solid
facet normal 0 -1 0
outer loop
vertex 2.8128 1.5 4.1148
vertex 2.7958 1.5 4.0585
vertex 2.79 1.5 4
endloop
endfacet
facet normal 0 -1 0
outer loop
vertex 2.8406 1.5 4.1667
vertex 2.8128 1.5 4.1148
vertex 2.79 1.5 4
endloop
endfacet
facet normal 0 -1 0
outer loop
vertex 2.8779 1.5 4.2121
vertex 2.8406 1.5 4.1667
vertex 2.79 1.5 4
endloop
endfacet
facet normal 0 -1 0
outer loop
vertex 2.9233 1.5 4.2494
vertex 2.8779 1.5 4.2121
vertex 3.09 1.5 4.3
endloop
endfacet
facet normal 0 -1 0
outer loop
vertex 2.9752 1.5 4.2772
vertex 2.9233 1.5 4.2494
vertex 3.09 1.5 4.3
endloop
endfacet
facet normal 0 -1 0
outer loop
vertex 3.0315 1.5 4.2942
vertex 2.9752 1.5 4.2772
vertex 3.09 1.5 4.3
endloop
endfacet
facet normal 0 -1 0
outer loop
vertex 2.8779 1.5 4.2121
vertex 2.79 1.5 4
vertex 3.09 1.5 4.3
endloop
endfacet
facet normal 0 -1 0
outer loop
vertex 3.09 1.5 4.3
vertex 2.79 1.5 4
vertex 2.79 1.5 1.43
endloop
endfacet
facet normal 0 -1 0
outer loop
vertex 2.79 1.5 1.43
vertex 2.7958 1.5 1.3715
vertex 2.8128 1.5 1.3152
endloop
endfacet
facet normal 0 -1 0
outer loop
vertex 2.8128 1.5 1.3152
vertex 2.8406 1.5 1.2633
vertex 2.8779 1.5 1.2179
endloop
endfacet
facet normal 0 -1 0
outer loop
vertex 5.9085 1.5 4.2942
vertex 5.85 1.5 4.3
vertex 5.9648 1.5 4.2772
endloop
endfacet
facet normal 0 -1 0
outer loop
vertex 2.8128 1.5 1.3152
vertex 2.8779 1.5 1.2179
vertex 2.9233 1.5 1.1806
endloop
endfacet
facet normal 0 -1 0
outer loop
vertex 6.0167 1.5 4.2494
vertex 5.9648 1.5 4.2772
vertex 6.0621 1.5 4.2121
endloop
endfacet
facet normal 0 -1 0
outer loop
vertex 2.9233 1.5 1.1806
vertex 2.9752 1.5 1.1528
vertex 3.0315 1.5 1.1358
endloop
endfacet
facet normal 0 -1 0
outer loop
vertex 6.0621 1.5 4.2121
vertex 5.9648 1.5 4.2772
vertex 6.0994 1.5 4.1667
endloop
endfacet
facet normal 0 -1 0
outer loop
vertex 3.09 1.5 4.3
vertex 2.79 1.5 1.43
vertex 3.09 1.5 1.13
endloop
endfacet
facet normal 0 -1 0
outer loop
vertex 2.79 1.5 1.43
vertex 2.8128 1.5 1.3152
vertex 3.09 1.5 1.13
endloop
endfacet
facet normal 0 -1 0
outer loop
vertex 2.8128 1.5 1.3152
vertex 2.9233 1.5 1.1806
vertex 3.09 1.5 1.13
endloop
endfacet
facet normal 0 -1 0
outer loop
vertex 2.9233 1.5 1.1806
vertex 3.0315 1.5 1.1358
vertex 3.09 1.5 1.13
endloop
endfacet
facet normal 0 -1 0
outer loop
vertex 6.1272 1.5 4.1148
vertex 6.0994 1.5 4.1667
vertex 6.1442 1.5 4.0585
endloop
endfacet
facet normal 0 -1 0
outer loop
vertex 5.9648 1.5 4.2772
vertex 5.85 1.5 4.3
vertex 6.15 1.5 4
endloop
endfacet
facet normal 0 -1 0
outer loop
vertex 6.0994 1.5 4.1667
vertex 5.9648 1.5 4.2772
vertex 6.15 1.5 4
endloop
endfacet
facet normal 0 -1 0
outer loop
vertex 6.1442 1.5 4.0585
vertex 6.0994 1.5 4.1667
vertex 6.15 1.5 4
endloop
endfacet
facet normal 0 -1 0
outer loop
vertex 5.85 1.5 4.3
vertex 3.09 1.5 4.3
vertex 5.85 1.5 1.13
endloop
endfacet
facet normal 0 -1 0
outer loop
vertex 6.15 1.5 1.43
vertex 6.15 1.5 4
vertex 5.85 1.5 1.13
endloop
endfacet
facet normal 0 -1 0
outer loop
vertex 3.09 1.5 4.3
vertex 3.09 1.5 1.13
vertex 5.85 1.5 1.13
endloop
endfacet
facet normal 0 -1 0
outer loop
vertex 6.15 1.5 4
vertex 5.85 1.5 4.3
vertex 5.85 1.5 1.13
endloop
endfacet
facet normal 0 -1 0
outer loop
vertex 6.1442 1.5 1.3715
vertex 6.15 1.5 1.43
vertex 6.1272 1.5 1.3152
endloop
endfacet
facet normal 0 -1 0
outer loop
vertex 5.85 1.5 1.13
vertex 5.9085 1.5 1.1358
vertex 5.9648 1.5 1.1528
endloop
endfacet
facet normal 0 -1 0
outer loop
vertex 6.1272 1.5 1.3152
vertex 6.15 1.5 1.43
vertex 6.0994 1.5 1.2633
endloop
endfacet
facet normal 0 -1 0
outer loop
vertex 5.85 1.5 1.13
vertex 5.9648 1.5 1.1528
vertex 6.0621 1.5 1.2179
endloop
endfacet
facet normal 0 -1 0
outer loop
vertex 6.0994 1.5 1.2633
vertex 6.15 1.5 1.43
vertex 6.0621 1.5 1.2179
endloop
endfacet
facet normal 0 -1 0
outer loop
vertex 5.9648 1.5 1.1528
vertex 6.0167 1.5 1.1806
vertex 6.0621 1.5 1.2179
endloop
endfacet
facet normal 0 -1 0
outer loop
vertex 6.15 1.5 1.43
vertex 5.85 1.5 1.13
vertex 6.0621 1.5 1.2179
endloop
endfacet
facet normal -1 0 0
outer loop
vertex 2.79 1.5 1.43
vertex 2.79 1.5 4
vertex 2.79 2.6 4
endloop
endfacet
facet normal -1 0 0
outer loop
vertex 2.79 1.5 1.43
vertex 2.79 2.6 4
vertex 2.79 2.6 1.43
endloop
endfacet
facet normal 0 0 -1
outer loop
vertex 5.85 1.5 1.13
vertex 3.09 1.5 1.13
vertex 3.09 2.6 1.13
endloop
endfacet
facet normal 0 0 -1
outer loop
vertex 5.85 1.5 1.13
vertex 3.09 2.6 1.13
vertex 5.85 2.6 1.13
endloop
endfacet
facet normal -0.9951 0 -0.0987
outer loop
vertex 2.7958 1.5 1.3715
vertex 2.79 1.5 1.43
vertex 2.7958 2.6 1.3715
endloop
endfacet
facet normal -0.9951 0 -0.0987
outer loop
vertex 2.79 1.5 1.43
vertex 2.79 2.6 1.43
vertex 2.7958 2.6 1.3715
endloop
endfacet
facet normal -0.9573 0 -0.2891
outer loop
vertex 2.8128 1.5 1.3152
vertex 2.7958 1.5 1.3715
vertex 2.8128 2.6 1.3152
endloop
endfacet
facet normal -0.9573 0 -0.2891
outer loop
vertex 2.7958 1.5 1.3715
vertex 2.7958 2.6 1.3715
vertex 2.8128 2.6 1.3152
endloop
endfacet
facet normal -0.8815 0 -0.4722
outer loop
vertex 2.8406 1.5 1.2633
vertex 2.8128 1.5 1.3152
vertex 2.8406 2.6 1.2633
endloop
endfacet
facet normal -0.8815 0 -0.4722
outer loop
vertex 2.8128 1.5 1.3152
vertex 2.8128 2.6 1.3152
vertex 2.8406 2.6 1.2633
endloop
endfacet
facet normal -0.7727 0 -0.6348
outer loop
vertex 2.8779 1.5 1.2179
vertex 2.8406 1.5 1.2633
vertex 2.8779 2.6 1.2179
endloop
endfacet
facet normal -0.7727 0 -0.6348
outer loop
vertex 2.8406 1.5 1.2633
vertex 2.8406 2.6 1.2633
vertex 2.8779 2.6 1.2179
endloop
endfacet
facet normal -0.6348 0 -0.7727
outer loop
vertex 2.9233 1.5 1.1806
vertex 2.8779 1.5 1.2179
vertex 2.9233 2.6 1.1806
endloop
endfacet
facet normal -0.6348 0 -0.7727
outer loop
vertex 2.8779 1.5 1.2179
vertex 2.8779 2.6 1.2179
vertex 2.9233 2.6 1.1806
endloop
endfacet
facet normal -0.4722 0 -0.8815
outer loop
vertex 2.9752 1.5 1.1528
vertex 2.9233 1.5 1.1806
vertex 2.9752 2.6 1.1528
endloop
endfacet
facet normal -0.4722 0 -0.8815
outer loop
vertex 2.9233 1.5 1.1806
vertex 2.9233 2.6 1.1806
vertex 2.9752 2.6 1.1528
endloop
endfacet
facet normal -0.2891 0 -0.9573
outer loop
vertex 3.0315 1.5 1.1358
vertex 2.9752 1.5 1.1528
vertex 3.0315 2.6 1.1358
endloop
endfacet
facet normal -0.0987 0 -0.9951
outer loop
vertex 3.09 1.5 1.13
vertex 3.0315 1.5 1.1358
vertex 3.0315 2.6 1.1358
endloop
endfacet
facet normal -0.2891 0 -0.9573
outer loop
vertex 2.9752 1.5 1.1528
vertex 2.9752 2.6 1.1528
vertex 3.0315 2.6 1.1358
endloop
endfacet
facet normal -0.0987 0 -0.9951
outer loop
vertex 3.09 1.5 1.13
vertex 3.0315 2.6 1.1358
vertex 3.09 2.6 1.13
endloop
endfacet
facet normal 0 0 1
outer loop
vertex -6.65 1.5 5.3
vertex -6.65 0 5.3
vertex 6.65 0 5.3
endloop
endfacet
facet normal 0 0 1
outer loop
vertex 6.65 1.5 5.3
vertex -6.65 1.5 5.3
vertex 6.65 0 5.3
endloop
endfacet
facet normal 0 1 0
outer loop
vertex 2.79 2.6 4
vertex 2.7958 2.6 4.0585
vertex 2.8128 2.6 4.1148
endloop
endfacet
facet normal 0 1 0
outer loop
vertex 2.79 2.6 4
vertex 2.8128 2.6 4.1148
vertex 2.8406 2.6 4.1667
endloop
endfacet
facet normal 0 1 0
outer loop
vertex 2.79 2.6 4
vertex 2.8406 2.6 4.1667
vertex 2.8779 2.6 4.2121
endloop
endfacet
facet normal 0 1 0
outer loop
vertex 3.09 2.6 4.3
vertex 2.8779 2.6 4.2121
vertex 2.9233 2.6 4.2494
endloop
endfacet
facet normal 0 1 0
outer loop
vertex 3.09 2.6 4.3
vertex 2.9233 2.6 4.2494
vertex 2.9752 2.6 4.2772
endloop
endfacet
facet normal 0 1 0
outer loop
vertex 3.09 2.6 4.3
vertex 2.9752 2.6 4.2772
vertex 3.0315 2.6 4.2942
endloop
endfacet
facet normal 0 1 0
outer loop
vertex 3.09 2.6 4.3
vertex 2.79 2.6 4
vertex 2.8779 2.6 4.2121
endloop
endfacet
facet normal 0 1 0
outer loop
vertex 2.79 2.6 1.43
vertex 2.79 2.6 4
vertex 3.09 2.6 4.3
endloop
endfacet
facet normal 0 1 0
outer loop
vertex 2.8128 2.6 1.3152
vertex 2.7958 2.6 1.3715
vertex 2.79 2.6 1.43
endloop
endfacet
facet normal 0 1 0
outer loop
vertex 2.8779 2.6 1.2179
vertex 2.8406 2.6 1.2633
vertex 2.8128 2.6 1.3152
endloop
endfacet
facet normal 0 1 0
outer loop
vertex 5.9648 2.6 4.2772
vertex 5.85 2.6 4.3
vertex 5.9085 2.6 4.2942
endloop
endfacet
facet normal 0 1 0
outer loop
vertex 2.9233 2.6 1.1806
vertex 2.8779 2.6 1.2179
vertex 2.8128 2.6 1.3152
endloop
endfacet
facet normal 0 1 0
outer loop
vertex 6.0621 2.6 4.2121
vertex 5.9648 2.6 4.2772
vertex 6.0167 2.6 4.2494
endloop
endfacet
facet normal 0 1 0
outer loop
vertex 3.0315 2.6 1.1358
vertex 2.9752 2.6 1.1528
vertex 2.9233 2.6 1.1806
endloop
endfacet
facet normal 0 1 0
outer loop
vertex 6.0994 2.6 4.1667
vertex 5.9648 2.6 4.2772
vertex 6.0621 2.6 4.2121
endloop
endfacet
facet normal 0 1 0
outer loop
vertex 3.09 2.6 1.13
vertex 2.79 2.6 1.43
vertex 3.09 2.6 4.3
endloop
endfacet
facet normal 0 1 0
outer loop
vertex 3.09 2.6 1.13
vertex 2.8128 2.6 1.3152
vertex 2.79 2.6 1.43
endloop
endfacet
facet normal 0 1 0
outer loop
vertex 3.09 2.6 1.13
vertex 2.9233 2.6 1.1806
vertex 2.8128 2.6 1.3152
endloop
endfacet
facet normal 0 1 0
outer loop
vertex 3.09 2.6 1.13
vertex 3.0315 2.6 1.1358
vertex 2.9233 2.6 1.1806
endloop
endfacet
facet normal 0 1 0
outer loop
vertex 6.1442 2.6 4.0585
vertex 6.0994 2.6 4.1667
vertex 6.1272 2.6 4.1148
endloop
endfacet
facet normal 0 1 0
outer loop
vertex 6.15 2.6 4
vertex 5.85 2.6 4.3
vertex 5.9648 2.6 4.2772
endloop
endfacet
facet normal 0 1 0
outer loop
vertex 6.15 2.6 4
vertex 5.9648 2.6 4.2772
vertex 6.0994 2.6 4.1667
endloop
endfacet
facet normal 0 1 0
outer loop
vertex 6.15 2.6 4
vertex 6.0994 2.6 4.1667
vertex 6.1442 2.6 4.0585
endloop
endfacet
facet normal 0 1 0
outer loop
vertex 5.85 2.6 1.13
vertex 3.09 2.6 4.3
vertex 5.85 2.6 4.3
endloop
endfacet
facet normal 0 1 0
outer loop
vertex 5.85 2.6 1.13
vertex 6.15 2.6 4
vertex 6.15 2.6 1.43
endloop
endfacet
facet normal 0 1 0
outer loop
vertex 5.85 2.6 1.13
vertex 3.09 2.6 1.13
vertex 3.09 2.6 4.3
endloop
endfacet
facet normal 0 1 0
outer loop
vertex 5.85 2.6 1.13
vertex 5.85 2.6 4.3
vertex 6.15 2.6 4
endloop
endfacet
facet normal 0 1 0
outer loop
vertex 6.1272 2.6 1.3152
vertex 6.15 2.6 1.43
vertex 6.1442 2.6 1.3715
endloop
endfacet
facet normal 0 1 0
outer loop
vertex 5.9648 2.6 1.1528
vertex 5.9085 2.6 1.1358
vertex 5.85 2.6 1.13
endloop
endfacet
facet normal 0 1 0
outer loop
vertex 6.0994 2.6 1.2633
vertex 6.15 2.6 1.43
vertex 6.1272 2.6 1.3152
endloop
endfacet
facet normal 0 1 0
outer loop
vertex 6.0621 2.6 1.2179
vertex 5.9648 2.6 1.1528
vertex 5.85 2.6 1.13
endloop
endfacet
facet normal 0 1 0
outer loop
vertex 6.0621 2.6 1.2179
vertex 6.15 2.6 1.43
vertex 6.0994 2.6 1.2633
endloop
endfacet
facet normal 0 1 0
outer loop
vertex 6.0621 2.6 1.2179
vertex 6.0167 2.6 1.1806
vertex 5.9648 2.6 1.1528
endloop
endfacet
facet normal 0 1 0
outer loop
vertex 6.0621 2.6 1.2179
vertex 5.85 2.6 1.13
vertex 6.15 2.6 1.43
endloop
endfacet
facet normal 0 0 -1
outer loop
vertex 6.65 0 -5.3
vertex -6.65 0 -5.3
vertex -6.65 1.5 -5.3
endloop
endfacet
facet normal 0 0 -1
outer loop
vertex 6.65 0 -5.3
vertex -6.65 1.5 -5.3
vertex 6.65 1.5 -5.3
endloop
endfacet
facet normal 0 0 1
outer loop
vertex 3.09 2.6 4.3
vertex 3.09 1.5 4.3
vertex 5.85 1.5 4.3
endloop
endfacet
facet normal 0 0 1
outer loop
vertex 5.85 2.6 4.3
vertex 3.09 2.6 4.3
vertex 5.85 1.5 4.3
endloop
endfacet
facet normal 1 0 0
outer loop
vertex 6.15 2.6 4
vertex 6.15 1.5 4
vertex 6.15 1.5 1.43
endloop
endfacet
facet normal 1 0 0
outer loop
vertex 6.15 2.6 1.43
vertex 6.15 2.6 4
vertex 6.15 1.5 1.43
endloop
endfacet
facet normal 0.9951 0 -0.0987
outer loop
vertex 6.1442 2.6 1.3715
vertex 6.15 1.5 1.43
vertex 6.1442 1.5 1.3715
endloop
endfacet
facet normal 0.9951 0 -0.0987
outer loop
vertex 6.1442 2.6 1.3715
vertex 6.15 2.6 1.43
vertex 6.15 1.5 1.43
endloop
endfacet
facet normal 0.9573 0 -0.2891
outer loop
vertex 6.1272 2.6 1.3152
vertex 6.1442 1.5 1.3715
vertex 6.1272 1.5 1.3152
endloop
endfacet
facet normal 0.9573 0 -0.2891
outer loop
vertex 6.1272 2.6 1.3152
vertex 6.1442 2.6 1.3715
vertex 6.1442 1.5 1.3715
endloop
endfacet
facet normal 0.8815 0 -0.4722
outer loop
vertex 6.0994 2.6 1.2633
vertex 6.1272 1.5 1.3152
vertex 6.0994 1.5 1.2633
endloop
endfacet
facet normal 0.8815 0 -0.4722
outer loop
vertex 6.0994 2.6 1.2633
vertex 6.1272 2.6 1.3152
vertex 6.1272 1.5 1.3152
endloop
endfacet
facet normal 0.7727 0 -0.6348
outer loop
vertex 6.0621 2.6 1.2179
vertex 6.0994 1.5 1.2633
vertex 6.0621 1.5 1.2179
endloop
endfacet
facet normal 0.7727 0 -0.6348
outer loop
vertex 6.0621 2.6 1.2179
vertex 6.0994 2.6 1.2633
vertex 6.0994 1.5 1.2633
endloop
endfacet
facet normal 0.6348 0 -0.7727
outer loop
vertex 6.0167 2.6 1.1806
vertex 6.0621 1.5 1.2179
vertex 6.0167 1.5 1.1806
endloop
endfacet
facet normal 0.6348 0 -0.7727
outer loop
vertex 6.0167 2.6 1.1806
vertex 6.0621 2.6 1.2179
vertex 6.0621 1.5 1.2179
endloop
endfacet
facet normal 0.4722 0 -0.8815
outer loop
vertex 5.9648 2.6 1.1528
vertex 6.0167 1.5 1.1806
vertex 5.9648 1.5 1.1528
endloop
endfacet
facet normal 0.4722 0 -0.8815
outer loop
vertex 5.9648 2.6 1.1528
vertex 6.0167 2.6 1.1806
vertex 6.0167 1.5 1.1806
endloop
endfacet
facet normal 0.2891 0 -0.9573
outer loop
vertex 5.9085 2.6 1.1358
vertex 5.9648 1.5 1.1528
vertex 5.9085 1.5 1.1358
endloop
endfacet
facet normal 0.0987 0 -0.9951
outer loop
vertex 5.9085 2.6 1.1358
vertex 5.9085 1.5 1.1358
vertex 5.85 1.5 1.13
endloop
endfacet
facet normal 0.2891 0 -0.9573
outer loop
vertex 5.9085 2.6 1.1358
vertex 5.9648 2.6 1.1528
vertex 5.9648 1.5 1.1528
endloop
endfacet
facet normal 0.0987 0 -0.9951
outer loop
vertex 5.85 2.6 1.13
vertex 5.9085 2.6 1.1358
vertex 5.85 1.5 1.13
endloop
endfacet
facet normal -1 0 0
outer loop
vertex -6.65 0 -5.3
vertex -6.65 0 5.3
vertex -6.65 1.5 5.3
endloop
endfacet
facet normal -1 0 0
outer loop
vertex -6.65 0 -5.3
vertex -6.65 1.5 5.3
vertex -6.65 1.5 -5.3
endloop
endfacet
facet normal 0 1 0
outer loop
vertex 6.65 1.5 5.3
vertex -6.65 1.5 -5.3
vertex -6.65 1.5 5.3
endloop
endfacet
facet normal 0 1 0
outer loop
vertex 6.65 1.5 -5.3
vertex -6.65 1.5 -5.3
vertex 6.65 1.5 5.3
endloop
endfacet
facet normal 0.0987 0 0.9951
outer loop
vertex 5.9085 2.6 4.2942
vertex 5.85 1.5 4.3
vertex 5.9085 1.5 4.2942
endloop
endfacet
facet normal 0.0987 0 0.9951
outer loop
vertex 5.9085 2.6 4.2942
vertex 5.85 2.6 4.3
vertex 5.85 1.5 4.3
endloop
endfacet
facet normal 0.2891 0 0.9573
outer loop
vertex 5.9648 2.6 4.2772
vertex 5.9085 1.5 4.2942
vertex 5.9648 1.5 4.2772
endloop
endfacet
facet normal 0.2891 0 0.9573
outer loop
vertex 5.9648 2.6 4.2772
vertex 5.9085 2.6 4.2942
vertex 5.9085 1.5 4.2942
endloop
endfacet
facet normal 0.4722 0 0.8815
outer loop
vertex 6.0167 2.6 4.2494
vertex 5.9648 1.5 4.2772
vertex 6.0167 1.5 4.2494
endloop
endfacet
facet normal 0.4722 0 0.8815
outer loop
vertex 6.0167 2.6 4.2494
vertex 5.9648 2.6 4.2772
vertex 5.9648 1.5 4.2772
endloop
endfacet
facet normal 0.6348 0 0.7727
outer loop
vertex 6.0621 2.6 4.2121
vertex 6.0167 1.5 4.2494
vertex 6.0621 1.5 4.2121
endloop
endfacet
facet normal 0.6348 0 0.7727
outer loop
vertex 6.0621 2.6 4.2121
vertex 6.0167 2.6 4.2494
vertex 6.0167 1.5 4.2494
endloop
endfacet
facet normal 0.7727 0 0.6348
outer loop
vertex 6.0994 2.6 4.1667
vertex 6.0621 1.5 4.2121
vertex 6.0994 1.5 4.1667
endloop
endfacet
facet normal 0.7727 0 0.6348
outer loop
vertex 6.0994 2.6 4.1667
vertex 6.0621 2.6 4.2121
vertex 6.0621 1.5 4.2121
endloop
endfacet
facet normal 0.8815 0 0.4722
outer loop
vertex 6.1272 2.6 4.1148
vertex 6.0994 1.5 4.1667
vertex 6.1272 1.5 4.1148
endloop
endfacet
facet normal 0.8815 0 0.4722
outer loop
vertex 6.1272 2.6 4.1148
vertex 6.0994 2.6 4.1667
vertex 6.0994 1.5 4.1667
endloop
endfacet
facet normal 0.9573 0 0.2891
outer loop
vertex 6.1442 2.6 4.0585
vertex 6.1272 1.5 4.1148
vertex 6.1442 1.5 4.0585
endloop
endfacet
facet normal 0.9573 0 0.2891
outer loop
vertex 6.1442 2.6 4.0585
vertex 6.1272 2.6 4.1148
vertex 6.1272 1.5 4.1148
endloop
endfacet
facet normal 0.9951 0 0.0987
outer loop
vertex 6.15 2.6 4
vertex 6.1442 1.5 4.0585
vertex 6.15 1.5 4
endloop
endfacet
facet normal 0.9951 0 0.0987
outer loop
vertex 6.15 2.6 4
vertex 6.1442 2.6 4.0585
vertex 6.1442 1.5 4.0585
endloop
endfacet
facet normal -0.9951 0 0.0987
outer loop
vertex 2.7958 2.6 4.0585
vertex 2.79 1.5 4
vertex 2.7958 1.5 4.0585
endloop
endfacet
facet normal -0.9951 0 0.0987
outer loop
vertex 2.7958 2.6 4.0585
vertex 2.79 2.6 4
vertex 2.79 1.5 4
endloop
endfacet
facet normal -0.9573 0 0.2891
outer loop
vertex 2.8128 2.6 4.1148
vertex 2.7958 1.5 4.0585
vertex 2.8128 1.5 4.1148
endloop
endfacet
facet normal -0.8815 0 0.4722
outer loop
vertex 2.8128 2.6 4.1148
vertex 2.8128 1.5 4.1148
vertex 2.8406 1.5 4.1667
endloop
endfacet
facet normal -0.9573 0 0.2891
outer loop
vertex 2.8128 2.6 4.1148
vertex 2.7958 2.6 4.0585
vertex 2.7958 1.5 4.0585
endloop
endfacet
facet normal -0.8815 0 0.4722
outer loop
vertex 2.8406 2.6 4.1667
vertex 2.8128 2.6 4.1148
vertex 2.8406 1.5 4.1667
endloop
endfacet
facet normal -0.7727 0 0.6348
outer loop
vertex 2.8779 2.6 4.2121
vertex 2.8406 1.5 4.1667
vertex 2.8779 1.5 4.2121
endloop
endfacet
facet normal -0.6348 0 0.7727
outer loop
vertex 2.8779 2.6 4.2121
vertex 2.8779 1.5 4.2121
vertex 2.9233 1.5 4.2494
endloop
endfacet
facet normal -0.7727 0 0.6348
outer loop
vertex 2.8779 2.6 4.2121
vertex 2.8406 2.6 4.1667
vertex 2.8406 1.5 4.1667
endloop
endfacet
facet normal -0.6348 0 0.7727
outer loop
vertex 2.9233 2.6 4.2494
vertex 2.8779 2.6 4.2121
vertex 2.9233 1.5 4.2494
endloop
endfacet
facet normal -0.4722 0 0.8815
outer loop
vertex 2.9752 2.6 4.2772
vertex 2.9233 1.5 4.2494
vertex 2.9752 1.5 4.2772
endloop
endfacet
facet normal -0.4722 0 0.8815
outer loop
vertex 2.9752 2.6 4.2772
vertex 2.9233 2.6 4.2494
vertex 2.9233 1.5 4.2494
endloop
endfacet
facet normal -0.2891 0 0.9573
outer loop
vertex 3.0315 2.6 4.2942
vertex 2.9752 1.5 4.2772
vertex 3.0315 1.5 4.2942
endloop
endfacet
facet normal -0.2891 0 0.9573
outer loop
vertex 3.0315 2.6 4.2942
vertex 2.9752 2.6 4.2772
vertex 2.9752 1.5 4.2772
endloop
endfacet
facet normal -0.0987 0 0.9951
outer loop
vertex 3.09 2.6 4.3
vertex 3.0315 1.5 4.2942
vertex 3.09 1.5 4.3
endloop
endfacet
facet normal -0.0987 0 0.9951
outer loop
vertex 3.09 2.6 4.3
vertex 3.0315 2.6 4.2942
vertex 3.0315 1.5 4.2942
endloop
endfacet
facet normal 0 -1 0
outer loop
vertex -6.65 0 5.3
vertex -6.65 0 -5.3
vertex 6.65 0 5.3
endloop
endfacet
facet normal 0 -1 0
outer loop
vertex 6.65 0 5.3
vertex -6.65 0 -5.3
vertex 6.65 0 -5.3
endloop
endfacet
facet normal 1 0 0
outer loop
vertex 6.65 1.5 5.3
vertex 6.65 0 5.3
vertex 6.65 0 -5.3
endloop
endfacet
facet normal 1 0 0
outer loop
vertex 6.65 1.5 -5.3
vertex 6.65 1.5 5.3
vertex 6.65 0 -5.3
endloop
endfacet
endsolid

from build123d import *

# Parameters (mm, degrees)
SKETCH_1_W      = 13.3
SKETCH_1_H      = 10.6
EXTRUDE_1_DEPTH = 1.5
SKETCH_2_W      = 3.36
SKETCH_2_H      = 3.17
EXTRUDE_2_DEPTH = 1.1
FILLET_1_R      = 0.3


with BuildPart() as part:
    # Эскиз1 → Бобышка-Вытянуть1 (new body)
    with BuildSketch(Plane(origin=(0, 0, 0), x_dir=(1, 0, 0), z_dir=(0, 1, 0))):
        Rectangle(SKETCH_1_W, SKETCH_1_H)
    extrude(amount=EXTRUDE_1_DEPTH)


with BuildPart() as body_2:
    # Эскиз2 → Бобышка-Вытянуть2 (new body)
    with BuildSketch(Plane(origin=(0, 1.5, 0), x_dir=(1, 0, 0), z_dir=(0, 1, 0))):
        with Locations((4.47, -2.715)):
            Rectangle(SKETCH_2_W, SKETCH_2_H)
    extrude(amount=EXTRUDE_2_DEPTH)

    # Скругление1
    fillet_1_edges = [body_2.edges().sort_by_distance(p)[0] for p in [
        (6.15, 2.05, 4.3),
        (2.79, 2.05, 4.3),
        (2.79, 2.05, 1.13),
        (6.15, 2.05, 1.13),
    ]]
    fillet(fillet_1_edges, radius=FILLET_1_R)


solid = Compound([part.part, body_2.part])
